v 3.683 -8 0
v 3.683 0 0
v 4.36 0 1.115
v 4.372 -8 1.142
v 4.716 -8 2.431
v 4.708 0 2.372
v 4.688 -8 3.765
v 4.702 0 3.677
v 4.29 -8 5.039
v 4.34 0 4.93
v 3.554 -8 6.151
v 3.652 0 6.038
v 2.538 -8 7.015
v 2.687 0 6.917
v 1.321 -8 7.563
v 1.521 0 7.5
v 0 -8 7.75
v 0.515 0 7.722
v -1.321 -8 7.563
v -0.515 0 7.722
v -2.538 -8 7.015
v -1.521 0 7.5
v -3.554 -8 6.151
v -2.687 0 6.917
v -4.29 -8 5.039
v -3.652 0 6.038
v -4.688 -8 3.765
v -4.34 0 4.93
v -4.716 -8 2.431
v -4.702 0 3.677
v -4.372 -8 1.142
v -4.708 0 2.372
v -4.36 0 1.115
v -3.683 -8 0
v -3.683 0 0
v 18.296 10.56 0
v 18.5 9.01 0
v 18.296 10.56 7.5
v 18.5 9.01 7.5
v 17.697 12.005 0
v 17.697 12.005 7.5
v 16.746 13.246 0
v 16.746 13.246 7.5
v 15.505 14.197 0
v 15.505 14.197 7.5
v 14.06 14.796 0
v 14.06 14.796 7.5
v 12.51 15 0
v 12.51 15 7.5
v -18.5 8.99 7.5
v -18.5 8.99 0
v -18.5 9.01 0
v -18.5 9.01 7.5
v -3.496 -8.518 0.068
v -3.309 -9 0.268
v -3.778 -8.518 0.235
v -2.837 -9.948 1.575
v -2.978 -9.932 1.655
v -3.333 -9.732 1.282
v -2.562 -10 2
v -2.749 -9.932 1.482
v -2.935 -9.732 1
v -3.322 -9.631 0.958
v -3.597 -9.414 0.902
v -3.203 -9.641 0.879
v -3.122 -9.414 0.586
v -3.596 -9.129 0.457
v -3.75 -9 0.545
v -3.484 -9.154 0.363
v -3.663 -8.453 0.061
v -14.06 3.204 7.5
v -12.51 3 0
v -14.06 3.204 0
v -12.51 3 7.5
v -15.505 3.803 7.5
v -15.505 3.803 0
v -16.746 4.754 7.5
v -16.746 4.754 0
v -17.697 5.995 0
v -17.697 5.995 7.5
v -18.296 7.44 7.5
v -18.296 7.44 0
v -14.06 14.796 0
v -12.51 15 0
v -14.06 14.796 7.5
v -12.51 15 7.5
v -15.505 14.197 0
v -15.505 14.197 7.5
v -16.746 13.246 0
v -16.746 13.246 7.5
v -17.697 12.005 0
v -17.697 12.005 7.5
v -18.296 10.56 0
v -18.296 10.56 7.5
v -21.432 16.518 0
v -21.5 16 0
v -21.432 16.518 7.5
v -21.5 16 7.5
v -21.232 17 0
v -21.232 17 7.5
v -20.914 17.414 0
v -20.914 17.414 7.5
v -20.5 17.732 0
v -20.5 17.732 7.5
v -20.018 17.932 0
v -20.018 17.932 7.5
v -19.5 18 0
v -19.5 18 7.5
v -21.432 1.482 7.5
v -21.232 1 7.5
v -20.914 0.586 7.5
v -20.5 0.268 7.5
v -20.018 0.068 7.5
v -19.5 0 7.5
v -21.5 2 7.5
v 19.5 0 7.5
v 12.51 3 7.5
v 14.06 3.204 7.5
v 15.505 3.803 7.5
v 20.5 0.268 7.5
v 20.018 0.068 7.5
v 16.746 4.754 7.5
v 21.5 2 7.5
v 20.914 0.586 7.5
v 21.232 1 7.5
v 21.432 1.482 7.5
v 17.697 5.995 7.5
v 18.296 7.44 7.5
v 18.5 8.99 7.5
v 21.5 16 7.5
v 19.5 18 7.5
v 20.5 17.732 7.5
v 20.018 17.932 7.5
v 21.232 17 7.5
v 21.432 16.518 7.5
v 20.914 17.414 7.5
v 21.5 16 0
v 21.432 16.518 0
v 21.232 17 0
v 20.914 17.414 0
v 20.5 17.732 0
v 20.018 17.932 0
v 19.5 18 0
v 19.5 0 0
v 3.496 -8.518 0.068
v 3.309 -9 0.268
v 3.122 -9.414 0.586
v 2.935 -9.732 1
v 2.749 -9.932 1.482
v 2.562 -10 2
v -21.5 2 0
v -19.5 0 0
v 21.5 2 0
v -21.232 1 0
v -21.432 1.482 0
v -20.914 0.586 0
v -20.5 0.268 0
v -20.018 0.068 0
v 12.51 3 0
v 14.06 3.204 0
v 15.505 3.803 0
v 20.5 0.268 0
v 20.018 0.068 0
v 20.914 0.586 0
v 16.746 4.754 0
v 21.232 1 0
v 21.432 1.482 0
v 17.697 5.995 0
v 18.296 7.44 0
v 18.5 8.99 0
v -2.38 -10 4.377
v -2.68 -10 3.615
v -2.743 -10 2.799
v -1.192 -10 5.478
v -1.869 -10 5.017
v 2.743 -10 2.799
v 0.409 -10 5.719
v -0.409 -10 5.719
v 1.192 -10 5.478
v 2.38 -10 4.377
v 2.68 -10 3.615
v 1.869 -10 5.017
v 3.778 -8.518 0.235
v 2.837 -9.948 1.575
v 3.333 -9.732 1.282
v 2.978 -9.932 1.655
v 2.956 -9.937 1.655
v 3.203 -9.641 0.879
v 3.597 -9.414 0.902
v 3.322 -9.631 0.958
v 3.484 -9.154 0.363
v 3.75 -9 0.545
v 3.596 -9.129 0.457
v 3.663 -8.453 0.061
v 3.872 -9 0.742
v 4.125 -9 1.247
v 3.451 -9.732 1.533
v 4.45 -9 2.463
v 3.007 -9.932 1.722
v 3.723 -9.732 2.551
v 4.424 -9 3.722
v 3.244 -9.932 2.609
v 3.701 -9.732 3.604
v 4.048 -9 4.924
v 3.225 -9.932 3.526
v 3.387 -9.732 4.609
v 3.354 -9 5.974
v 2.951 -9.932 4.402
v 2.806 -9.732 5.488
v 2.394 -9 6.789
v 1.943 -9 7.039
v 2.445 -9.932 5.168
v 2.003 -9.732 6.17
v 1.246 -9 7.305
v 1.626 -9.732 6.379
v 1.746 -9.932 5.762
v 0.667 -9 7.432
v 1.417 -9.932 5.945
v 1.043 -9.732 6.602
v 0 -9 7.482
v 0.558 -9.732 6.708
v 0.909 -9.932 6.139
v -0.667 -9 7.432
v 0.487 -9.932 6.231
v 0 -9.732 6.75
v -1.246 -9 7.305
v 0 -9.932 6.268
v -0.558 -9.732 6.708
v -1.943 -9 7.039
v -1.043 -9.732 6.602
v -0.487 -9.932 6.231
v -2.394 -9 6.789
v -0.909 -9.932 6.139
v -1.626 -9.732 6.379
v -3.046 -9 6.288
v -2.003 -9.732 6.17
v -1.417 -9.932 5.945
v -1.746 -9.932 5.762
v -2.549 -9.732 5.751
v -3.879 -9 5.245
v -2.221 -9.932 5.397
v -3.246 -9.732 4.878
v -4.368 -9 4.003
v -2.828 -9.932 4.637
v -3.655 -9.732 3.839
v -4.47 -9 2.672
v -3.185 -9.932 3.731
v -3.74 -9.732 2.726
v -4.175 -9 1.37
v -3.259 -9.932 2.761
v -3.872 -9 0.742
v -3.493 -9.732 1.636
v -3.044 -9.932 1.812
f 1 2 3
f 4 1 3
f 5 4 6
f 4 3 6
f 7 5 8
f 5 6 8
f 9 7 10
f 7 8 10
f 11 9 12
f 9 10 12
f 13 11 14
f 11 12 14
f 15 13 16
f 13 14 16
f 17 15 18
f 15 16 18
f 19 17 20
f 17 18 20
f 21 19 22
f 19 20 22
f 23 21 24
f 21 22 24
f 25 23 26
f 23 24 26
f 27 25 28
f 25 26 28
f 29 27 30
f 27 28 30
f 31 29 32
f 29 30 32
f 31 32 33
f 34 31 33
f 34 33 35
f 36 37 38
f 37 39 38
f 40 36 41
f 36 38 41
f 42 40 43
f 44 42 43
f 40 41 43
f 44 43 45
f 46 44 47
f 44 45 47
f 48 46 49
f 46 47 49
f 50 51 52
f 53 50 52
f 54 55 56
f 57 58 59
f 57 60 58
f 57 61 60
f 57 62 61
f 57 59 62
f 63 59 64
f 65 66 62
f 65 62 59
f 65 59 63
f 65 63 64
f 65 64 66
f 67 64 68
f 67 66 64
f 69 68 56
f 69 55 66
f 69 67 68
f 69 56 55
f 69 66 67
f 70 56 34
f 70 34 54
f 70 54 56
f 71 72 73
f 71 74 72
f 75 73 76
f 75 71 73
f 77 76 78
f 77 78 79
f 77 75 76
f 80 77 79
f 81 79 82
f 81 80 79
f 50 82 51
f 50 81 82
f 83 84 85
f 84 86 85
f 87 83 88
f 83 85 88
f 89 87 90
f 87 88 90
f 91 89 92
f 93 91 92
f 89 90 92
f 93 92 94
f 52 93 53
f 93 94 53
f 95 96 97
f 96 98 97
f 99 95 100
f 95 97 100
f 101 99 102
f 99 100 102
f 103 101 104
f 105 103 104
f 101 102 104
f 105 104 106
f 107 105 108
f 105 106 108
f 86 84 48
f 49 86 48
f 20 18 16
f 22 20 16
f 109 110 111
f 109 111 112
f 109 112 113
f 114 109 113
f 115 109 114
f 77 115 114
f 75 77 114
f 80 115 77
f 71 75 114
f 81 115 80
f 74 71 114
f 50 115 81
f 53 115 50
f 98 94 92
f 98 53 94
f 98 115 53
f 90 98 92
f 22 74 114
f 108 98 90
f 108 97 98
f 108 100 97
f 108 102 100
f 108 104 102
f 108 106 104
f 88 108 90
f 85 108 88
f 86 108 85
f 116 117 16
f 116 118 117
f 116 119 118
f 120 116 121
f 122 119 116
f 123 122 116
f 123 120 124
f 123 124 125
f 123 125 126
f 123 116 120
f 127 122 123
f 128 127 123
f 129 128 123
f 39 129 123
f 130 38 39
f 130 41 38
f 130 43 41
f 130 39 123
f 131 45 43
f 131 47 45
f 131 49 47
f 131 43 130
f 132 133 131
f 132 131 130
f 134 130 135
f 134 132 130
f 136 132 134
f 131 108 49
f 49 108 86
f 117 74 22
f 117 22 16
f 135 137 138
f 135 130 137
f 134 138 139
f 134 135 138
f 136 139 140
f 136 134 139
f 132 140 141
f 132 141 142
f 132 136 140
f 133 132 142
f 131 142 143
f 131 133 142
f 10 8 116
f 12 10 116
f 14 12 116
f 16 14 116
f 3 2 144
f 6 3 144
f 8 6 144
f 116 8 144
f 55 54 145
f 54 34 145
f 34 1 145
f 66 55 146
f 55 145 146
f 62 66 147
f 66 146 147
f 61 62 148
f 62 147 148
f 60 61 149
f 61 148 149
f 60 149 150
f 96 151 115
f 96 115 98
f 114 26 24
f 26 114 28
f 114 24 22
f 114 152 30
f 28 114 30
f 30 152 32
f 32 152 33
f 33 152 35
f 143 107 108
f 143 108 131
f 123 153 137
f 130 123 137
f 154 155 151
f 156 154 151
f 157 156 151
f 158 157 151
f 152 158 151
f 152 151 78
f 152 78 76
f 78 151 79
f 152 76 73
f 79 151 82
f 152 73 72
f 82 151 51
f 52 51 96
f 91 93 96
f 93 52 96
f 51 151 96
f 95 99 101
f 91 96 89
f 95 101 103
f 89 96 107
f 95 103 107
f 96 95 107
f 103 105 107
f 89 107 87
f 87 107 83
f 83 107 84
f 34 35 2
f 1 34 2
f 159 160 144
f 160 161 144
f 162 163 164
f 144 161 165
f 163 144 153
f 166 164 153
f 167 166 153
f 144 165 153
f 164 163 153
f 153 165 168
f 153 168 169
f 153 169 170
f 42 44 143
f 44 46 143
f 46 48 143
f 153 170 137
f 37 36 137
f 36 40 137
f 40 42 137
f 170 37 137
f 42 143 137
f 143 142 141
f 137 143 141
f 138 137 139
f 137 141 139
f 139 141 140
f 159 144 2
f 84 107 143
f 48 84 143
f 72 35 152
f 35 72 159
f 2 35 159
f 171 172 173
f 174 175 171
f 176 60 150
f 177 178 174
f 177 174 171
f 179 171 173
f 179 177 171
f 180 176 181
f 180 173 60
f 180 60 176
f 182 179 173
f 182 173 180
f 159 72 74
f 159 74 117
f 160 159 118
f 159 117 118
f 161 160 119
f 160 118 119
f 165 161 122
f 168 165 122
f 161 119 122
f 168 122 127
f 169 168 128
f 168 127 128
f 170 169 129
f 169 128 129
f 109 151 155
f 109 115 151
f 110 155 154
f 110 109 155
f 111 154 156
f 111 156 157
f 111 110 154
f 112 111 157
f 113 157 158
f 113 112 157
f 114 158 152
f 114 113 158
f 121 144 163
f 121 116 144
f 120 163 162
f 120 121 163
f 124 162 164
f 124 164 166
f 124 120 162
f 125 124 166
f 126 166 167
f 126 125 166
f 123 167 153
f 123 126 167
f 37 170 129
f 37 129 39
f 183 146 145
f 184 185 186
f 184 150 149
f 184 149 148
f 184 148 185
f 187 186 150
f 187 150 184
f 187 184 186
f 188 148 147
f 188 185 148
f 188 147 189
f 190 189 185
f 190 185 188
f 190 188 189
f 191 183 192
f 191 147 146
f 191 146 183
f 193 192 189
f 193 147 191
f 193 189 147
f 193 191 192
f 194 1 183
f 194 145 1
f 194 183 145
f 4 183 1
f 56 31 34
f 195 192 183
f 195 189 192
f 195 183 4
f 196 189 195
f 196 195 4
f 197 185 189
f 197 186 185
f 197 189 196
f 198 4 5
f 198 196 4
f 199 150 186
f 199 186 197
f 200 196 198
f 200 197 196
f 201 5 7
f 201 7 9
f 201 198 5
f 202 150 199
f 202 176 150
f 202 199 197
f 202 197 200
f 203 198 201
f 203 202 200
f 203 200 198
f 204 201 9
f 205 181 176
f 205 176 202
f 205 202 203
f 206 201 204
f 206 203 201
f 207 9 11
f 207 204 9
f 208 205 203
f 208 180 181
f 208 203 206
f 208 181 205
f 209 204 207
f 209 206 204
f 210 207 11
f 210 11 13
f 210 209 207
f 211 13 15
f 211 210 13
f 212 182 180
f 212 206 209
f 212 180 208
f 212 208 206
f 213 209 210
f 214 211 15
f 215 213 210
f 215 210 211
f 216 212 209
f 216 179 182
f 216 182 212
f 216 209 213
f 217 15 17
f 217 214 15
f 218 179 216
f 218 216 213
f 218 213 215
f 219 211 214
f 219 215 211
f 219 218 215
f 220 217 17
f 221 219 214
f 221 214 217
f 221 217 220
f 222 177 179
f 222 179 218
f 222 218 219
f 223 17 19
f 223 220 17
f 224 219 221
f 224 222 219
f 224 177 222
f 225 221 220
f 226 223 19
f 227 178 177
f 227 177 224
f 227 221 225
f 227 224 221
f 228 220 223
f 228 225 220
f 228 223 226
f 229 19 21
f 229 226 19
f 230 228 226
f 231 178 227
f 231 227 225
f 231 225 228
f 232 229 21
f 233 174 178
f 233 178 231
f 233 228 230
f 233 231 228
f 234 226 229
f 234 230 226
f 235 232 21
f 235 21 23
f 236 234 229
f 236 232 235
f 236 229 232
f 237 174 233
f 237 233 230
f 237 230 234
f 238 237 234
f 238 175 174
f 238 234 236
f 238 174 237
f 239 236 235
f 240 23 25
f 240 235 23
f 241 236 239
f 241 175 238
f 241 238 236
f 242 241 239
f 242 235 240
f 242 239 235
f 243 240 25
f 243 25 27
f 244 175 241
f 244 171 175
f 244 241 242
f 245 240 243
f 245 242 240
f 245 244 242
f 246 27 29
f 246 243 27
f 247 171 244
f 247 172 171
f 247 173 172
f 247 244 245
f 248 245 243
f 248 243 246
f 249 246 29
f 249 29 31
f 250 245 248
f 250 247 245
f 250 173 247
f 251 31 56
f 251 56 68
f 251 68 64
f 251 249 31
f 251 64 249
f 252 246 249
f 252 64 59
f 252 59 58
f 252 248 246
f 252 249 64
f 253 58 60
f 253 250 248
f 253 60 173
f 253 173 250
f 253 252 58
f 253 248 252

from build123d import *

# Parameters (mm, degrees)
PAD_DEPTH     = 10
SKETCH001_W   = 43
SKETCH001_H   = 18
SKETCH001_W_2 = 37
SKETCH001_H_2 = 12
PAD001_DEPTH  = 7.5
FILLET_R      = 5.99
FILLET001_R   = 2
FILLET002_R   = 2


with BuildPart() as part:
    # Sketch → Pad (new body)
    with BuildSketch(Plane.XZ):
        with BuildLine():
            ThreePointArc((3.68273, 0), (0, 7.75), (-3.68273, 0))
            Line((-3.68273, 0), (3.68273, 0))
        make_face()
    extrude(amount=PAD_DEPTH)

    # Sketch001 → Pad001 (join)
    with BuildSketch(Plane.XY):
        with Locations((0, 9)):
            Rectangle(SKETCH001_W, SKETCH001_H)
        with Locations((0, 9)):
            Rectangle(SKETCH001_W_2, SKETCH001_H_2, mode=Mode.SUBTRACT)
    extrude(amount=PAD001_DEPTH)

    # Fillet
    fillet_edges = [part.edges().sort_by_distance(p)[0] for p in [
        (-18.5, 15, 3.75),
        (-18.5, 3, 3.75),
        (18.5, 3, 3.75),
        (18.5, 15, 3.75),
    ]]
    fillet(fillet_edges, radius=FILLET_R)

    # Fillet001
    fillet001_edges = [part.edges().sort_by_distance(p)[0] for p in [
        (-21.5, 0, 3.75),
        (-21.5, 18, 3.75),
        (21.5, 18, 3.75),
        (21.5, 0, 3.75),
    ]]
    fillet(fillet001_edges, radius=FILLET001_R)

    # Fillet002
    fillet002_edges = [part.edges().sort_by_distance(p)[0] for p in [
        (0, -10, 7.75),
        (0, -10, 0),
    ]]
    fillet(fillet002_edges, radius=FILLET002_R)


solid = part.part
